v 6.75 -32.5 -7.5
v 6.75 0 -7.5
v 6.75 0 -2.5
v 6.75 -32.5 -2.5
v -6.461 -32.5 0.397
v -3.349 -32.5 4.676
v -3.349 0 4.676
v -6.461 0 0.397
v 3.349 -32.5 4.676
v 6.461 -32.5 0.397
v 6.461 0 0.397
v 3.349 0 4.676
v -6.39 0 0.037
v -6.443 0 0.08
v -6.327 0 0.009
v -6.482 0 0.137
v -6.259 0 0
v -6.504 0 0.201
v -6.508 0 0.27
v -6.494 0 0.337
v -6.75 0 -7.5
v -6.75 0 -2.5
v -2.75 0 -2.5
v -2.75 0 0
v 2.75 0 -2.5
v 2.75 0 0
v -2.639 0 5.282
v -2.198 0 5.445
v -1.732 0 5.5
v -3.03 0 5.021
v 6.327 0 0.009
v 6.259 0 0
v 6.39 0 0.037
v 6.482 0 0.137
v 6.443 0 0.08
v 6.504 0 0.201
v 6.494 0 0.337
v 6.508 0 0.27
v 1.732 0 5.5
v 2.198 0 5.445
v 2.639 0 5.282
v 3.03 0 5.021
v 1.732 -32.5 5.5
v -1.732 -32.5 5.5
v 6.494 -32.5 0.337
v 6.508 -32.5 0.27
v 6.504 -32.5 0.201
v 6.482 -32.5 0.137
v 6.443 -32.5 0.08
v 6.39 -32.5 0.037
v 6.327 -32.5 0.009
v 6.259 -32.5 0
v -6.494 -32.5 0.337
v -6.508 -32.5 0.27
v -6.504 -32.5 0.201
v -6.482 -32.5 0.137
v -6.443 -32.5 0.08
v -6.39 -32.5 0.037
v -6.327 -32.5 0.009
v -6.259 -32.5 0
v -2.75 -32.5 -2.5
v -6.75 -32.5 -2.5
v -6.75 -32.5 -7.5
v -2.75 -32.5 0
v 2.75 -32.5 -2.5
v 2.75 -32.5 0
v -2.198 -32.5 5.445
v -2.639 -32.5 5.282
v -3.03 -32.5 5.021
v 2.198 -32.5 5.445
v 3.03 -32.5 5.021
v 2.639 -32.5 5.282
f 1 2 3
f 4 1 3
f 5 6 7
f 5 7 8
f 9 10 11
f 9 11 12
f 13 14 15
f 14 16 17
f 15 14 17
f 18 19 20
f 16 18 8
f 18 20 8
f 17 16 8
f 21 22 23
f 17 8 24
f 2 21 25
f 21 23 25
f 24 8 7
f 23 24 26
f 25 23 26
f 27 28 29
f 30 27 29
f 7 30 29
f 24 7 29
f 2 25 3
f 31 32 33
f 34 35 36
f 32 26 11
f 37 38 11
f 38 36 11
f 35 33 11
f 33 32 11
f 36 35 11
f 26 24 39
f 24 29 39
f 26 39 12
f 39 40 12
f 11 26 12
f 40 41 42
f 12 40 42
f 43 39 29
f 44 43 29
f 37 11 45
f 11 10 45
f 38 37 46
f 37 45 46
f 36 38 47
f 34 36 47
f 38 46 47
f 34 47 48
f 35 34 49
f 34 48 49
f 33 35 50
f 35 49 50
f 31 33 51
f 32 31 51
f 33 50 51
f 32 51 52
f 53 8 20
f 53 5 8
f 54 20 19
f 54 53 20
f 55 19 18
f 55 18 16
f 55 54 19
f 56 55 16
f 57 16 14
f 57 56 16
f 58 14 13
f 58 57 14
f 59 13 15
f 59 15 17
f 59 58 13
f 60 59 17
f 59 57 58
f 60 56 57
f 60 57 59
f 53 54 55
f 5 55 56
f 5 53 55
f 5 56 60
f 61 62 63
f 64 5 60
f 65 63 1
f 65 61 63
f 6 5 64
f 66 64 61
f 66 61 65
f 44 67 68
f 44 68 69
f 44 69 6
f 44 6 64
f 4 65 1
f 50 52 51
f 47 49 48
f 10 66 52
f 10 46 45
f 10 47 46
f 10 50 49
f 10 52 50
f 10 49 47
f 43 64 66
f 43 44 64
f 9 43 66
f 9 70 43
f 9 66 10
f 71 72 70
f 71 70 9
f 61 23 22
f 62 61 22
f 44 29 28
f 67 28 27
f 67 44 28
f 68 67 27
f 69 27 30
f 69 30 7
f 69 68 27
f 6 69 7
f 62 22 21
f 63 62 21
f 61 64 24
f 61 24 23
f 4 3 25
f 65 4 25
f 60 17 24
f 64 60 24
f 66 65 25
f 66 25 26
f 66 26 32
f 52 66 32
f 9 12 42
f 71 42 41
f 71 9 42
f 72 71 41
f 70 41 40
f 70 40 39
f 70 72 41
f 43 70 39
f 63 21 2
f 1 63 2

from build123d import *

# Parameters (mm, degrees)
F0_W     = 2.75
F0_H     = 5.5
F1_DEPTH = 32.5
F2_R     = 2
F3_R     = 0.25


with BuildPart() as f1:
    # F0 (on Front) → F1 (new body)
    with BuildSketch(Plane.XZ):
        with Locations((1.375, 2.75)):
            Rectangle(F0_W, F0_H)
        Polygon((0, 0), (-2.75, 0), (-2.75, -2.5), (-6.75, -2.5), (-6.75, -7.5), (6.75, -7.5), (6.75, -2.5), (2.75, -2.5), (2.75, 0), align=None)
        Polygon((2.75, 5.5), (2.75, 0), (6.75, 0), align=None)
        with Locations((-1.375, 2.75)):
            Rectangle(F0_W, F0_H)
        Polygon((-2.75, 5.5), (-6.75, 0), (-2.75, 0), align=None)
    extrude(amount=F1_DEPTH)

    # F2
    f2_edges = [f1.edges().sort_by_distance(p)[0] for p in [
        (2.75, -16.25, 5.5),
        (-2.75, -16.25, 5.5),
    ]]
    fillet(f2_edges, radius=F2_R)

    # F3
    f3_edges = [f1.edges().sort_by_distance(p)[0] for p in [
        (6.75, -16.25, 0),
        (-6.75, -16.25, 0),
    ]]
    fillet(f3_edges, radius=F3_R)


solid = f1.part
